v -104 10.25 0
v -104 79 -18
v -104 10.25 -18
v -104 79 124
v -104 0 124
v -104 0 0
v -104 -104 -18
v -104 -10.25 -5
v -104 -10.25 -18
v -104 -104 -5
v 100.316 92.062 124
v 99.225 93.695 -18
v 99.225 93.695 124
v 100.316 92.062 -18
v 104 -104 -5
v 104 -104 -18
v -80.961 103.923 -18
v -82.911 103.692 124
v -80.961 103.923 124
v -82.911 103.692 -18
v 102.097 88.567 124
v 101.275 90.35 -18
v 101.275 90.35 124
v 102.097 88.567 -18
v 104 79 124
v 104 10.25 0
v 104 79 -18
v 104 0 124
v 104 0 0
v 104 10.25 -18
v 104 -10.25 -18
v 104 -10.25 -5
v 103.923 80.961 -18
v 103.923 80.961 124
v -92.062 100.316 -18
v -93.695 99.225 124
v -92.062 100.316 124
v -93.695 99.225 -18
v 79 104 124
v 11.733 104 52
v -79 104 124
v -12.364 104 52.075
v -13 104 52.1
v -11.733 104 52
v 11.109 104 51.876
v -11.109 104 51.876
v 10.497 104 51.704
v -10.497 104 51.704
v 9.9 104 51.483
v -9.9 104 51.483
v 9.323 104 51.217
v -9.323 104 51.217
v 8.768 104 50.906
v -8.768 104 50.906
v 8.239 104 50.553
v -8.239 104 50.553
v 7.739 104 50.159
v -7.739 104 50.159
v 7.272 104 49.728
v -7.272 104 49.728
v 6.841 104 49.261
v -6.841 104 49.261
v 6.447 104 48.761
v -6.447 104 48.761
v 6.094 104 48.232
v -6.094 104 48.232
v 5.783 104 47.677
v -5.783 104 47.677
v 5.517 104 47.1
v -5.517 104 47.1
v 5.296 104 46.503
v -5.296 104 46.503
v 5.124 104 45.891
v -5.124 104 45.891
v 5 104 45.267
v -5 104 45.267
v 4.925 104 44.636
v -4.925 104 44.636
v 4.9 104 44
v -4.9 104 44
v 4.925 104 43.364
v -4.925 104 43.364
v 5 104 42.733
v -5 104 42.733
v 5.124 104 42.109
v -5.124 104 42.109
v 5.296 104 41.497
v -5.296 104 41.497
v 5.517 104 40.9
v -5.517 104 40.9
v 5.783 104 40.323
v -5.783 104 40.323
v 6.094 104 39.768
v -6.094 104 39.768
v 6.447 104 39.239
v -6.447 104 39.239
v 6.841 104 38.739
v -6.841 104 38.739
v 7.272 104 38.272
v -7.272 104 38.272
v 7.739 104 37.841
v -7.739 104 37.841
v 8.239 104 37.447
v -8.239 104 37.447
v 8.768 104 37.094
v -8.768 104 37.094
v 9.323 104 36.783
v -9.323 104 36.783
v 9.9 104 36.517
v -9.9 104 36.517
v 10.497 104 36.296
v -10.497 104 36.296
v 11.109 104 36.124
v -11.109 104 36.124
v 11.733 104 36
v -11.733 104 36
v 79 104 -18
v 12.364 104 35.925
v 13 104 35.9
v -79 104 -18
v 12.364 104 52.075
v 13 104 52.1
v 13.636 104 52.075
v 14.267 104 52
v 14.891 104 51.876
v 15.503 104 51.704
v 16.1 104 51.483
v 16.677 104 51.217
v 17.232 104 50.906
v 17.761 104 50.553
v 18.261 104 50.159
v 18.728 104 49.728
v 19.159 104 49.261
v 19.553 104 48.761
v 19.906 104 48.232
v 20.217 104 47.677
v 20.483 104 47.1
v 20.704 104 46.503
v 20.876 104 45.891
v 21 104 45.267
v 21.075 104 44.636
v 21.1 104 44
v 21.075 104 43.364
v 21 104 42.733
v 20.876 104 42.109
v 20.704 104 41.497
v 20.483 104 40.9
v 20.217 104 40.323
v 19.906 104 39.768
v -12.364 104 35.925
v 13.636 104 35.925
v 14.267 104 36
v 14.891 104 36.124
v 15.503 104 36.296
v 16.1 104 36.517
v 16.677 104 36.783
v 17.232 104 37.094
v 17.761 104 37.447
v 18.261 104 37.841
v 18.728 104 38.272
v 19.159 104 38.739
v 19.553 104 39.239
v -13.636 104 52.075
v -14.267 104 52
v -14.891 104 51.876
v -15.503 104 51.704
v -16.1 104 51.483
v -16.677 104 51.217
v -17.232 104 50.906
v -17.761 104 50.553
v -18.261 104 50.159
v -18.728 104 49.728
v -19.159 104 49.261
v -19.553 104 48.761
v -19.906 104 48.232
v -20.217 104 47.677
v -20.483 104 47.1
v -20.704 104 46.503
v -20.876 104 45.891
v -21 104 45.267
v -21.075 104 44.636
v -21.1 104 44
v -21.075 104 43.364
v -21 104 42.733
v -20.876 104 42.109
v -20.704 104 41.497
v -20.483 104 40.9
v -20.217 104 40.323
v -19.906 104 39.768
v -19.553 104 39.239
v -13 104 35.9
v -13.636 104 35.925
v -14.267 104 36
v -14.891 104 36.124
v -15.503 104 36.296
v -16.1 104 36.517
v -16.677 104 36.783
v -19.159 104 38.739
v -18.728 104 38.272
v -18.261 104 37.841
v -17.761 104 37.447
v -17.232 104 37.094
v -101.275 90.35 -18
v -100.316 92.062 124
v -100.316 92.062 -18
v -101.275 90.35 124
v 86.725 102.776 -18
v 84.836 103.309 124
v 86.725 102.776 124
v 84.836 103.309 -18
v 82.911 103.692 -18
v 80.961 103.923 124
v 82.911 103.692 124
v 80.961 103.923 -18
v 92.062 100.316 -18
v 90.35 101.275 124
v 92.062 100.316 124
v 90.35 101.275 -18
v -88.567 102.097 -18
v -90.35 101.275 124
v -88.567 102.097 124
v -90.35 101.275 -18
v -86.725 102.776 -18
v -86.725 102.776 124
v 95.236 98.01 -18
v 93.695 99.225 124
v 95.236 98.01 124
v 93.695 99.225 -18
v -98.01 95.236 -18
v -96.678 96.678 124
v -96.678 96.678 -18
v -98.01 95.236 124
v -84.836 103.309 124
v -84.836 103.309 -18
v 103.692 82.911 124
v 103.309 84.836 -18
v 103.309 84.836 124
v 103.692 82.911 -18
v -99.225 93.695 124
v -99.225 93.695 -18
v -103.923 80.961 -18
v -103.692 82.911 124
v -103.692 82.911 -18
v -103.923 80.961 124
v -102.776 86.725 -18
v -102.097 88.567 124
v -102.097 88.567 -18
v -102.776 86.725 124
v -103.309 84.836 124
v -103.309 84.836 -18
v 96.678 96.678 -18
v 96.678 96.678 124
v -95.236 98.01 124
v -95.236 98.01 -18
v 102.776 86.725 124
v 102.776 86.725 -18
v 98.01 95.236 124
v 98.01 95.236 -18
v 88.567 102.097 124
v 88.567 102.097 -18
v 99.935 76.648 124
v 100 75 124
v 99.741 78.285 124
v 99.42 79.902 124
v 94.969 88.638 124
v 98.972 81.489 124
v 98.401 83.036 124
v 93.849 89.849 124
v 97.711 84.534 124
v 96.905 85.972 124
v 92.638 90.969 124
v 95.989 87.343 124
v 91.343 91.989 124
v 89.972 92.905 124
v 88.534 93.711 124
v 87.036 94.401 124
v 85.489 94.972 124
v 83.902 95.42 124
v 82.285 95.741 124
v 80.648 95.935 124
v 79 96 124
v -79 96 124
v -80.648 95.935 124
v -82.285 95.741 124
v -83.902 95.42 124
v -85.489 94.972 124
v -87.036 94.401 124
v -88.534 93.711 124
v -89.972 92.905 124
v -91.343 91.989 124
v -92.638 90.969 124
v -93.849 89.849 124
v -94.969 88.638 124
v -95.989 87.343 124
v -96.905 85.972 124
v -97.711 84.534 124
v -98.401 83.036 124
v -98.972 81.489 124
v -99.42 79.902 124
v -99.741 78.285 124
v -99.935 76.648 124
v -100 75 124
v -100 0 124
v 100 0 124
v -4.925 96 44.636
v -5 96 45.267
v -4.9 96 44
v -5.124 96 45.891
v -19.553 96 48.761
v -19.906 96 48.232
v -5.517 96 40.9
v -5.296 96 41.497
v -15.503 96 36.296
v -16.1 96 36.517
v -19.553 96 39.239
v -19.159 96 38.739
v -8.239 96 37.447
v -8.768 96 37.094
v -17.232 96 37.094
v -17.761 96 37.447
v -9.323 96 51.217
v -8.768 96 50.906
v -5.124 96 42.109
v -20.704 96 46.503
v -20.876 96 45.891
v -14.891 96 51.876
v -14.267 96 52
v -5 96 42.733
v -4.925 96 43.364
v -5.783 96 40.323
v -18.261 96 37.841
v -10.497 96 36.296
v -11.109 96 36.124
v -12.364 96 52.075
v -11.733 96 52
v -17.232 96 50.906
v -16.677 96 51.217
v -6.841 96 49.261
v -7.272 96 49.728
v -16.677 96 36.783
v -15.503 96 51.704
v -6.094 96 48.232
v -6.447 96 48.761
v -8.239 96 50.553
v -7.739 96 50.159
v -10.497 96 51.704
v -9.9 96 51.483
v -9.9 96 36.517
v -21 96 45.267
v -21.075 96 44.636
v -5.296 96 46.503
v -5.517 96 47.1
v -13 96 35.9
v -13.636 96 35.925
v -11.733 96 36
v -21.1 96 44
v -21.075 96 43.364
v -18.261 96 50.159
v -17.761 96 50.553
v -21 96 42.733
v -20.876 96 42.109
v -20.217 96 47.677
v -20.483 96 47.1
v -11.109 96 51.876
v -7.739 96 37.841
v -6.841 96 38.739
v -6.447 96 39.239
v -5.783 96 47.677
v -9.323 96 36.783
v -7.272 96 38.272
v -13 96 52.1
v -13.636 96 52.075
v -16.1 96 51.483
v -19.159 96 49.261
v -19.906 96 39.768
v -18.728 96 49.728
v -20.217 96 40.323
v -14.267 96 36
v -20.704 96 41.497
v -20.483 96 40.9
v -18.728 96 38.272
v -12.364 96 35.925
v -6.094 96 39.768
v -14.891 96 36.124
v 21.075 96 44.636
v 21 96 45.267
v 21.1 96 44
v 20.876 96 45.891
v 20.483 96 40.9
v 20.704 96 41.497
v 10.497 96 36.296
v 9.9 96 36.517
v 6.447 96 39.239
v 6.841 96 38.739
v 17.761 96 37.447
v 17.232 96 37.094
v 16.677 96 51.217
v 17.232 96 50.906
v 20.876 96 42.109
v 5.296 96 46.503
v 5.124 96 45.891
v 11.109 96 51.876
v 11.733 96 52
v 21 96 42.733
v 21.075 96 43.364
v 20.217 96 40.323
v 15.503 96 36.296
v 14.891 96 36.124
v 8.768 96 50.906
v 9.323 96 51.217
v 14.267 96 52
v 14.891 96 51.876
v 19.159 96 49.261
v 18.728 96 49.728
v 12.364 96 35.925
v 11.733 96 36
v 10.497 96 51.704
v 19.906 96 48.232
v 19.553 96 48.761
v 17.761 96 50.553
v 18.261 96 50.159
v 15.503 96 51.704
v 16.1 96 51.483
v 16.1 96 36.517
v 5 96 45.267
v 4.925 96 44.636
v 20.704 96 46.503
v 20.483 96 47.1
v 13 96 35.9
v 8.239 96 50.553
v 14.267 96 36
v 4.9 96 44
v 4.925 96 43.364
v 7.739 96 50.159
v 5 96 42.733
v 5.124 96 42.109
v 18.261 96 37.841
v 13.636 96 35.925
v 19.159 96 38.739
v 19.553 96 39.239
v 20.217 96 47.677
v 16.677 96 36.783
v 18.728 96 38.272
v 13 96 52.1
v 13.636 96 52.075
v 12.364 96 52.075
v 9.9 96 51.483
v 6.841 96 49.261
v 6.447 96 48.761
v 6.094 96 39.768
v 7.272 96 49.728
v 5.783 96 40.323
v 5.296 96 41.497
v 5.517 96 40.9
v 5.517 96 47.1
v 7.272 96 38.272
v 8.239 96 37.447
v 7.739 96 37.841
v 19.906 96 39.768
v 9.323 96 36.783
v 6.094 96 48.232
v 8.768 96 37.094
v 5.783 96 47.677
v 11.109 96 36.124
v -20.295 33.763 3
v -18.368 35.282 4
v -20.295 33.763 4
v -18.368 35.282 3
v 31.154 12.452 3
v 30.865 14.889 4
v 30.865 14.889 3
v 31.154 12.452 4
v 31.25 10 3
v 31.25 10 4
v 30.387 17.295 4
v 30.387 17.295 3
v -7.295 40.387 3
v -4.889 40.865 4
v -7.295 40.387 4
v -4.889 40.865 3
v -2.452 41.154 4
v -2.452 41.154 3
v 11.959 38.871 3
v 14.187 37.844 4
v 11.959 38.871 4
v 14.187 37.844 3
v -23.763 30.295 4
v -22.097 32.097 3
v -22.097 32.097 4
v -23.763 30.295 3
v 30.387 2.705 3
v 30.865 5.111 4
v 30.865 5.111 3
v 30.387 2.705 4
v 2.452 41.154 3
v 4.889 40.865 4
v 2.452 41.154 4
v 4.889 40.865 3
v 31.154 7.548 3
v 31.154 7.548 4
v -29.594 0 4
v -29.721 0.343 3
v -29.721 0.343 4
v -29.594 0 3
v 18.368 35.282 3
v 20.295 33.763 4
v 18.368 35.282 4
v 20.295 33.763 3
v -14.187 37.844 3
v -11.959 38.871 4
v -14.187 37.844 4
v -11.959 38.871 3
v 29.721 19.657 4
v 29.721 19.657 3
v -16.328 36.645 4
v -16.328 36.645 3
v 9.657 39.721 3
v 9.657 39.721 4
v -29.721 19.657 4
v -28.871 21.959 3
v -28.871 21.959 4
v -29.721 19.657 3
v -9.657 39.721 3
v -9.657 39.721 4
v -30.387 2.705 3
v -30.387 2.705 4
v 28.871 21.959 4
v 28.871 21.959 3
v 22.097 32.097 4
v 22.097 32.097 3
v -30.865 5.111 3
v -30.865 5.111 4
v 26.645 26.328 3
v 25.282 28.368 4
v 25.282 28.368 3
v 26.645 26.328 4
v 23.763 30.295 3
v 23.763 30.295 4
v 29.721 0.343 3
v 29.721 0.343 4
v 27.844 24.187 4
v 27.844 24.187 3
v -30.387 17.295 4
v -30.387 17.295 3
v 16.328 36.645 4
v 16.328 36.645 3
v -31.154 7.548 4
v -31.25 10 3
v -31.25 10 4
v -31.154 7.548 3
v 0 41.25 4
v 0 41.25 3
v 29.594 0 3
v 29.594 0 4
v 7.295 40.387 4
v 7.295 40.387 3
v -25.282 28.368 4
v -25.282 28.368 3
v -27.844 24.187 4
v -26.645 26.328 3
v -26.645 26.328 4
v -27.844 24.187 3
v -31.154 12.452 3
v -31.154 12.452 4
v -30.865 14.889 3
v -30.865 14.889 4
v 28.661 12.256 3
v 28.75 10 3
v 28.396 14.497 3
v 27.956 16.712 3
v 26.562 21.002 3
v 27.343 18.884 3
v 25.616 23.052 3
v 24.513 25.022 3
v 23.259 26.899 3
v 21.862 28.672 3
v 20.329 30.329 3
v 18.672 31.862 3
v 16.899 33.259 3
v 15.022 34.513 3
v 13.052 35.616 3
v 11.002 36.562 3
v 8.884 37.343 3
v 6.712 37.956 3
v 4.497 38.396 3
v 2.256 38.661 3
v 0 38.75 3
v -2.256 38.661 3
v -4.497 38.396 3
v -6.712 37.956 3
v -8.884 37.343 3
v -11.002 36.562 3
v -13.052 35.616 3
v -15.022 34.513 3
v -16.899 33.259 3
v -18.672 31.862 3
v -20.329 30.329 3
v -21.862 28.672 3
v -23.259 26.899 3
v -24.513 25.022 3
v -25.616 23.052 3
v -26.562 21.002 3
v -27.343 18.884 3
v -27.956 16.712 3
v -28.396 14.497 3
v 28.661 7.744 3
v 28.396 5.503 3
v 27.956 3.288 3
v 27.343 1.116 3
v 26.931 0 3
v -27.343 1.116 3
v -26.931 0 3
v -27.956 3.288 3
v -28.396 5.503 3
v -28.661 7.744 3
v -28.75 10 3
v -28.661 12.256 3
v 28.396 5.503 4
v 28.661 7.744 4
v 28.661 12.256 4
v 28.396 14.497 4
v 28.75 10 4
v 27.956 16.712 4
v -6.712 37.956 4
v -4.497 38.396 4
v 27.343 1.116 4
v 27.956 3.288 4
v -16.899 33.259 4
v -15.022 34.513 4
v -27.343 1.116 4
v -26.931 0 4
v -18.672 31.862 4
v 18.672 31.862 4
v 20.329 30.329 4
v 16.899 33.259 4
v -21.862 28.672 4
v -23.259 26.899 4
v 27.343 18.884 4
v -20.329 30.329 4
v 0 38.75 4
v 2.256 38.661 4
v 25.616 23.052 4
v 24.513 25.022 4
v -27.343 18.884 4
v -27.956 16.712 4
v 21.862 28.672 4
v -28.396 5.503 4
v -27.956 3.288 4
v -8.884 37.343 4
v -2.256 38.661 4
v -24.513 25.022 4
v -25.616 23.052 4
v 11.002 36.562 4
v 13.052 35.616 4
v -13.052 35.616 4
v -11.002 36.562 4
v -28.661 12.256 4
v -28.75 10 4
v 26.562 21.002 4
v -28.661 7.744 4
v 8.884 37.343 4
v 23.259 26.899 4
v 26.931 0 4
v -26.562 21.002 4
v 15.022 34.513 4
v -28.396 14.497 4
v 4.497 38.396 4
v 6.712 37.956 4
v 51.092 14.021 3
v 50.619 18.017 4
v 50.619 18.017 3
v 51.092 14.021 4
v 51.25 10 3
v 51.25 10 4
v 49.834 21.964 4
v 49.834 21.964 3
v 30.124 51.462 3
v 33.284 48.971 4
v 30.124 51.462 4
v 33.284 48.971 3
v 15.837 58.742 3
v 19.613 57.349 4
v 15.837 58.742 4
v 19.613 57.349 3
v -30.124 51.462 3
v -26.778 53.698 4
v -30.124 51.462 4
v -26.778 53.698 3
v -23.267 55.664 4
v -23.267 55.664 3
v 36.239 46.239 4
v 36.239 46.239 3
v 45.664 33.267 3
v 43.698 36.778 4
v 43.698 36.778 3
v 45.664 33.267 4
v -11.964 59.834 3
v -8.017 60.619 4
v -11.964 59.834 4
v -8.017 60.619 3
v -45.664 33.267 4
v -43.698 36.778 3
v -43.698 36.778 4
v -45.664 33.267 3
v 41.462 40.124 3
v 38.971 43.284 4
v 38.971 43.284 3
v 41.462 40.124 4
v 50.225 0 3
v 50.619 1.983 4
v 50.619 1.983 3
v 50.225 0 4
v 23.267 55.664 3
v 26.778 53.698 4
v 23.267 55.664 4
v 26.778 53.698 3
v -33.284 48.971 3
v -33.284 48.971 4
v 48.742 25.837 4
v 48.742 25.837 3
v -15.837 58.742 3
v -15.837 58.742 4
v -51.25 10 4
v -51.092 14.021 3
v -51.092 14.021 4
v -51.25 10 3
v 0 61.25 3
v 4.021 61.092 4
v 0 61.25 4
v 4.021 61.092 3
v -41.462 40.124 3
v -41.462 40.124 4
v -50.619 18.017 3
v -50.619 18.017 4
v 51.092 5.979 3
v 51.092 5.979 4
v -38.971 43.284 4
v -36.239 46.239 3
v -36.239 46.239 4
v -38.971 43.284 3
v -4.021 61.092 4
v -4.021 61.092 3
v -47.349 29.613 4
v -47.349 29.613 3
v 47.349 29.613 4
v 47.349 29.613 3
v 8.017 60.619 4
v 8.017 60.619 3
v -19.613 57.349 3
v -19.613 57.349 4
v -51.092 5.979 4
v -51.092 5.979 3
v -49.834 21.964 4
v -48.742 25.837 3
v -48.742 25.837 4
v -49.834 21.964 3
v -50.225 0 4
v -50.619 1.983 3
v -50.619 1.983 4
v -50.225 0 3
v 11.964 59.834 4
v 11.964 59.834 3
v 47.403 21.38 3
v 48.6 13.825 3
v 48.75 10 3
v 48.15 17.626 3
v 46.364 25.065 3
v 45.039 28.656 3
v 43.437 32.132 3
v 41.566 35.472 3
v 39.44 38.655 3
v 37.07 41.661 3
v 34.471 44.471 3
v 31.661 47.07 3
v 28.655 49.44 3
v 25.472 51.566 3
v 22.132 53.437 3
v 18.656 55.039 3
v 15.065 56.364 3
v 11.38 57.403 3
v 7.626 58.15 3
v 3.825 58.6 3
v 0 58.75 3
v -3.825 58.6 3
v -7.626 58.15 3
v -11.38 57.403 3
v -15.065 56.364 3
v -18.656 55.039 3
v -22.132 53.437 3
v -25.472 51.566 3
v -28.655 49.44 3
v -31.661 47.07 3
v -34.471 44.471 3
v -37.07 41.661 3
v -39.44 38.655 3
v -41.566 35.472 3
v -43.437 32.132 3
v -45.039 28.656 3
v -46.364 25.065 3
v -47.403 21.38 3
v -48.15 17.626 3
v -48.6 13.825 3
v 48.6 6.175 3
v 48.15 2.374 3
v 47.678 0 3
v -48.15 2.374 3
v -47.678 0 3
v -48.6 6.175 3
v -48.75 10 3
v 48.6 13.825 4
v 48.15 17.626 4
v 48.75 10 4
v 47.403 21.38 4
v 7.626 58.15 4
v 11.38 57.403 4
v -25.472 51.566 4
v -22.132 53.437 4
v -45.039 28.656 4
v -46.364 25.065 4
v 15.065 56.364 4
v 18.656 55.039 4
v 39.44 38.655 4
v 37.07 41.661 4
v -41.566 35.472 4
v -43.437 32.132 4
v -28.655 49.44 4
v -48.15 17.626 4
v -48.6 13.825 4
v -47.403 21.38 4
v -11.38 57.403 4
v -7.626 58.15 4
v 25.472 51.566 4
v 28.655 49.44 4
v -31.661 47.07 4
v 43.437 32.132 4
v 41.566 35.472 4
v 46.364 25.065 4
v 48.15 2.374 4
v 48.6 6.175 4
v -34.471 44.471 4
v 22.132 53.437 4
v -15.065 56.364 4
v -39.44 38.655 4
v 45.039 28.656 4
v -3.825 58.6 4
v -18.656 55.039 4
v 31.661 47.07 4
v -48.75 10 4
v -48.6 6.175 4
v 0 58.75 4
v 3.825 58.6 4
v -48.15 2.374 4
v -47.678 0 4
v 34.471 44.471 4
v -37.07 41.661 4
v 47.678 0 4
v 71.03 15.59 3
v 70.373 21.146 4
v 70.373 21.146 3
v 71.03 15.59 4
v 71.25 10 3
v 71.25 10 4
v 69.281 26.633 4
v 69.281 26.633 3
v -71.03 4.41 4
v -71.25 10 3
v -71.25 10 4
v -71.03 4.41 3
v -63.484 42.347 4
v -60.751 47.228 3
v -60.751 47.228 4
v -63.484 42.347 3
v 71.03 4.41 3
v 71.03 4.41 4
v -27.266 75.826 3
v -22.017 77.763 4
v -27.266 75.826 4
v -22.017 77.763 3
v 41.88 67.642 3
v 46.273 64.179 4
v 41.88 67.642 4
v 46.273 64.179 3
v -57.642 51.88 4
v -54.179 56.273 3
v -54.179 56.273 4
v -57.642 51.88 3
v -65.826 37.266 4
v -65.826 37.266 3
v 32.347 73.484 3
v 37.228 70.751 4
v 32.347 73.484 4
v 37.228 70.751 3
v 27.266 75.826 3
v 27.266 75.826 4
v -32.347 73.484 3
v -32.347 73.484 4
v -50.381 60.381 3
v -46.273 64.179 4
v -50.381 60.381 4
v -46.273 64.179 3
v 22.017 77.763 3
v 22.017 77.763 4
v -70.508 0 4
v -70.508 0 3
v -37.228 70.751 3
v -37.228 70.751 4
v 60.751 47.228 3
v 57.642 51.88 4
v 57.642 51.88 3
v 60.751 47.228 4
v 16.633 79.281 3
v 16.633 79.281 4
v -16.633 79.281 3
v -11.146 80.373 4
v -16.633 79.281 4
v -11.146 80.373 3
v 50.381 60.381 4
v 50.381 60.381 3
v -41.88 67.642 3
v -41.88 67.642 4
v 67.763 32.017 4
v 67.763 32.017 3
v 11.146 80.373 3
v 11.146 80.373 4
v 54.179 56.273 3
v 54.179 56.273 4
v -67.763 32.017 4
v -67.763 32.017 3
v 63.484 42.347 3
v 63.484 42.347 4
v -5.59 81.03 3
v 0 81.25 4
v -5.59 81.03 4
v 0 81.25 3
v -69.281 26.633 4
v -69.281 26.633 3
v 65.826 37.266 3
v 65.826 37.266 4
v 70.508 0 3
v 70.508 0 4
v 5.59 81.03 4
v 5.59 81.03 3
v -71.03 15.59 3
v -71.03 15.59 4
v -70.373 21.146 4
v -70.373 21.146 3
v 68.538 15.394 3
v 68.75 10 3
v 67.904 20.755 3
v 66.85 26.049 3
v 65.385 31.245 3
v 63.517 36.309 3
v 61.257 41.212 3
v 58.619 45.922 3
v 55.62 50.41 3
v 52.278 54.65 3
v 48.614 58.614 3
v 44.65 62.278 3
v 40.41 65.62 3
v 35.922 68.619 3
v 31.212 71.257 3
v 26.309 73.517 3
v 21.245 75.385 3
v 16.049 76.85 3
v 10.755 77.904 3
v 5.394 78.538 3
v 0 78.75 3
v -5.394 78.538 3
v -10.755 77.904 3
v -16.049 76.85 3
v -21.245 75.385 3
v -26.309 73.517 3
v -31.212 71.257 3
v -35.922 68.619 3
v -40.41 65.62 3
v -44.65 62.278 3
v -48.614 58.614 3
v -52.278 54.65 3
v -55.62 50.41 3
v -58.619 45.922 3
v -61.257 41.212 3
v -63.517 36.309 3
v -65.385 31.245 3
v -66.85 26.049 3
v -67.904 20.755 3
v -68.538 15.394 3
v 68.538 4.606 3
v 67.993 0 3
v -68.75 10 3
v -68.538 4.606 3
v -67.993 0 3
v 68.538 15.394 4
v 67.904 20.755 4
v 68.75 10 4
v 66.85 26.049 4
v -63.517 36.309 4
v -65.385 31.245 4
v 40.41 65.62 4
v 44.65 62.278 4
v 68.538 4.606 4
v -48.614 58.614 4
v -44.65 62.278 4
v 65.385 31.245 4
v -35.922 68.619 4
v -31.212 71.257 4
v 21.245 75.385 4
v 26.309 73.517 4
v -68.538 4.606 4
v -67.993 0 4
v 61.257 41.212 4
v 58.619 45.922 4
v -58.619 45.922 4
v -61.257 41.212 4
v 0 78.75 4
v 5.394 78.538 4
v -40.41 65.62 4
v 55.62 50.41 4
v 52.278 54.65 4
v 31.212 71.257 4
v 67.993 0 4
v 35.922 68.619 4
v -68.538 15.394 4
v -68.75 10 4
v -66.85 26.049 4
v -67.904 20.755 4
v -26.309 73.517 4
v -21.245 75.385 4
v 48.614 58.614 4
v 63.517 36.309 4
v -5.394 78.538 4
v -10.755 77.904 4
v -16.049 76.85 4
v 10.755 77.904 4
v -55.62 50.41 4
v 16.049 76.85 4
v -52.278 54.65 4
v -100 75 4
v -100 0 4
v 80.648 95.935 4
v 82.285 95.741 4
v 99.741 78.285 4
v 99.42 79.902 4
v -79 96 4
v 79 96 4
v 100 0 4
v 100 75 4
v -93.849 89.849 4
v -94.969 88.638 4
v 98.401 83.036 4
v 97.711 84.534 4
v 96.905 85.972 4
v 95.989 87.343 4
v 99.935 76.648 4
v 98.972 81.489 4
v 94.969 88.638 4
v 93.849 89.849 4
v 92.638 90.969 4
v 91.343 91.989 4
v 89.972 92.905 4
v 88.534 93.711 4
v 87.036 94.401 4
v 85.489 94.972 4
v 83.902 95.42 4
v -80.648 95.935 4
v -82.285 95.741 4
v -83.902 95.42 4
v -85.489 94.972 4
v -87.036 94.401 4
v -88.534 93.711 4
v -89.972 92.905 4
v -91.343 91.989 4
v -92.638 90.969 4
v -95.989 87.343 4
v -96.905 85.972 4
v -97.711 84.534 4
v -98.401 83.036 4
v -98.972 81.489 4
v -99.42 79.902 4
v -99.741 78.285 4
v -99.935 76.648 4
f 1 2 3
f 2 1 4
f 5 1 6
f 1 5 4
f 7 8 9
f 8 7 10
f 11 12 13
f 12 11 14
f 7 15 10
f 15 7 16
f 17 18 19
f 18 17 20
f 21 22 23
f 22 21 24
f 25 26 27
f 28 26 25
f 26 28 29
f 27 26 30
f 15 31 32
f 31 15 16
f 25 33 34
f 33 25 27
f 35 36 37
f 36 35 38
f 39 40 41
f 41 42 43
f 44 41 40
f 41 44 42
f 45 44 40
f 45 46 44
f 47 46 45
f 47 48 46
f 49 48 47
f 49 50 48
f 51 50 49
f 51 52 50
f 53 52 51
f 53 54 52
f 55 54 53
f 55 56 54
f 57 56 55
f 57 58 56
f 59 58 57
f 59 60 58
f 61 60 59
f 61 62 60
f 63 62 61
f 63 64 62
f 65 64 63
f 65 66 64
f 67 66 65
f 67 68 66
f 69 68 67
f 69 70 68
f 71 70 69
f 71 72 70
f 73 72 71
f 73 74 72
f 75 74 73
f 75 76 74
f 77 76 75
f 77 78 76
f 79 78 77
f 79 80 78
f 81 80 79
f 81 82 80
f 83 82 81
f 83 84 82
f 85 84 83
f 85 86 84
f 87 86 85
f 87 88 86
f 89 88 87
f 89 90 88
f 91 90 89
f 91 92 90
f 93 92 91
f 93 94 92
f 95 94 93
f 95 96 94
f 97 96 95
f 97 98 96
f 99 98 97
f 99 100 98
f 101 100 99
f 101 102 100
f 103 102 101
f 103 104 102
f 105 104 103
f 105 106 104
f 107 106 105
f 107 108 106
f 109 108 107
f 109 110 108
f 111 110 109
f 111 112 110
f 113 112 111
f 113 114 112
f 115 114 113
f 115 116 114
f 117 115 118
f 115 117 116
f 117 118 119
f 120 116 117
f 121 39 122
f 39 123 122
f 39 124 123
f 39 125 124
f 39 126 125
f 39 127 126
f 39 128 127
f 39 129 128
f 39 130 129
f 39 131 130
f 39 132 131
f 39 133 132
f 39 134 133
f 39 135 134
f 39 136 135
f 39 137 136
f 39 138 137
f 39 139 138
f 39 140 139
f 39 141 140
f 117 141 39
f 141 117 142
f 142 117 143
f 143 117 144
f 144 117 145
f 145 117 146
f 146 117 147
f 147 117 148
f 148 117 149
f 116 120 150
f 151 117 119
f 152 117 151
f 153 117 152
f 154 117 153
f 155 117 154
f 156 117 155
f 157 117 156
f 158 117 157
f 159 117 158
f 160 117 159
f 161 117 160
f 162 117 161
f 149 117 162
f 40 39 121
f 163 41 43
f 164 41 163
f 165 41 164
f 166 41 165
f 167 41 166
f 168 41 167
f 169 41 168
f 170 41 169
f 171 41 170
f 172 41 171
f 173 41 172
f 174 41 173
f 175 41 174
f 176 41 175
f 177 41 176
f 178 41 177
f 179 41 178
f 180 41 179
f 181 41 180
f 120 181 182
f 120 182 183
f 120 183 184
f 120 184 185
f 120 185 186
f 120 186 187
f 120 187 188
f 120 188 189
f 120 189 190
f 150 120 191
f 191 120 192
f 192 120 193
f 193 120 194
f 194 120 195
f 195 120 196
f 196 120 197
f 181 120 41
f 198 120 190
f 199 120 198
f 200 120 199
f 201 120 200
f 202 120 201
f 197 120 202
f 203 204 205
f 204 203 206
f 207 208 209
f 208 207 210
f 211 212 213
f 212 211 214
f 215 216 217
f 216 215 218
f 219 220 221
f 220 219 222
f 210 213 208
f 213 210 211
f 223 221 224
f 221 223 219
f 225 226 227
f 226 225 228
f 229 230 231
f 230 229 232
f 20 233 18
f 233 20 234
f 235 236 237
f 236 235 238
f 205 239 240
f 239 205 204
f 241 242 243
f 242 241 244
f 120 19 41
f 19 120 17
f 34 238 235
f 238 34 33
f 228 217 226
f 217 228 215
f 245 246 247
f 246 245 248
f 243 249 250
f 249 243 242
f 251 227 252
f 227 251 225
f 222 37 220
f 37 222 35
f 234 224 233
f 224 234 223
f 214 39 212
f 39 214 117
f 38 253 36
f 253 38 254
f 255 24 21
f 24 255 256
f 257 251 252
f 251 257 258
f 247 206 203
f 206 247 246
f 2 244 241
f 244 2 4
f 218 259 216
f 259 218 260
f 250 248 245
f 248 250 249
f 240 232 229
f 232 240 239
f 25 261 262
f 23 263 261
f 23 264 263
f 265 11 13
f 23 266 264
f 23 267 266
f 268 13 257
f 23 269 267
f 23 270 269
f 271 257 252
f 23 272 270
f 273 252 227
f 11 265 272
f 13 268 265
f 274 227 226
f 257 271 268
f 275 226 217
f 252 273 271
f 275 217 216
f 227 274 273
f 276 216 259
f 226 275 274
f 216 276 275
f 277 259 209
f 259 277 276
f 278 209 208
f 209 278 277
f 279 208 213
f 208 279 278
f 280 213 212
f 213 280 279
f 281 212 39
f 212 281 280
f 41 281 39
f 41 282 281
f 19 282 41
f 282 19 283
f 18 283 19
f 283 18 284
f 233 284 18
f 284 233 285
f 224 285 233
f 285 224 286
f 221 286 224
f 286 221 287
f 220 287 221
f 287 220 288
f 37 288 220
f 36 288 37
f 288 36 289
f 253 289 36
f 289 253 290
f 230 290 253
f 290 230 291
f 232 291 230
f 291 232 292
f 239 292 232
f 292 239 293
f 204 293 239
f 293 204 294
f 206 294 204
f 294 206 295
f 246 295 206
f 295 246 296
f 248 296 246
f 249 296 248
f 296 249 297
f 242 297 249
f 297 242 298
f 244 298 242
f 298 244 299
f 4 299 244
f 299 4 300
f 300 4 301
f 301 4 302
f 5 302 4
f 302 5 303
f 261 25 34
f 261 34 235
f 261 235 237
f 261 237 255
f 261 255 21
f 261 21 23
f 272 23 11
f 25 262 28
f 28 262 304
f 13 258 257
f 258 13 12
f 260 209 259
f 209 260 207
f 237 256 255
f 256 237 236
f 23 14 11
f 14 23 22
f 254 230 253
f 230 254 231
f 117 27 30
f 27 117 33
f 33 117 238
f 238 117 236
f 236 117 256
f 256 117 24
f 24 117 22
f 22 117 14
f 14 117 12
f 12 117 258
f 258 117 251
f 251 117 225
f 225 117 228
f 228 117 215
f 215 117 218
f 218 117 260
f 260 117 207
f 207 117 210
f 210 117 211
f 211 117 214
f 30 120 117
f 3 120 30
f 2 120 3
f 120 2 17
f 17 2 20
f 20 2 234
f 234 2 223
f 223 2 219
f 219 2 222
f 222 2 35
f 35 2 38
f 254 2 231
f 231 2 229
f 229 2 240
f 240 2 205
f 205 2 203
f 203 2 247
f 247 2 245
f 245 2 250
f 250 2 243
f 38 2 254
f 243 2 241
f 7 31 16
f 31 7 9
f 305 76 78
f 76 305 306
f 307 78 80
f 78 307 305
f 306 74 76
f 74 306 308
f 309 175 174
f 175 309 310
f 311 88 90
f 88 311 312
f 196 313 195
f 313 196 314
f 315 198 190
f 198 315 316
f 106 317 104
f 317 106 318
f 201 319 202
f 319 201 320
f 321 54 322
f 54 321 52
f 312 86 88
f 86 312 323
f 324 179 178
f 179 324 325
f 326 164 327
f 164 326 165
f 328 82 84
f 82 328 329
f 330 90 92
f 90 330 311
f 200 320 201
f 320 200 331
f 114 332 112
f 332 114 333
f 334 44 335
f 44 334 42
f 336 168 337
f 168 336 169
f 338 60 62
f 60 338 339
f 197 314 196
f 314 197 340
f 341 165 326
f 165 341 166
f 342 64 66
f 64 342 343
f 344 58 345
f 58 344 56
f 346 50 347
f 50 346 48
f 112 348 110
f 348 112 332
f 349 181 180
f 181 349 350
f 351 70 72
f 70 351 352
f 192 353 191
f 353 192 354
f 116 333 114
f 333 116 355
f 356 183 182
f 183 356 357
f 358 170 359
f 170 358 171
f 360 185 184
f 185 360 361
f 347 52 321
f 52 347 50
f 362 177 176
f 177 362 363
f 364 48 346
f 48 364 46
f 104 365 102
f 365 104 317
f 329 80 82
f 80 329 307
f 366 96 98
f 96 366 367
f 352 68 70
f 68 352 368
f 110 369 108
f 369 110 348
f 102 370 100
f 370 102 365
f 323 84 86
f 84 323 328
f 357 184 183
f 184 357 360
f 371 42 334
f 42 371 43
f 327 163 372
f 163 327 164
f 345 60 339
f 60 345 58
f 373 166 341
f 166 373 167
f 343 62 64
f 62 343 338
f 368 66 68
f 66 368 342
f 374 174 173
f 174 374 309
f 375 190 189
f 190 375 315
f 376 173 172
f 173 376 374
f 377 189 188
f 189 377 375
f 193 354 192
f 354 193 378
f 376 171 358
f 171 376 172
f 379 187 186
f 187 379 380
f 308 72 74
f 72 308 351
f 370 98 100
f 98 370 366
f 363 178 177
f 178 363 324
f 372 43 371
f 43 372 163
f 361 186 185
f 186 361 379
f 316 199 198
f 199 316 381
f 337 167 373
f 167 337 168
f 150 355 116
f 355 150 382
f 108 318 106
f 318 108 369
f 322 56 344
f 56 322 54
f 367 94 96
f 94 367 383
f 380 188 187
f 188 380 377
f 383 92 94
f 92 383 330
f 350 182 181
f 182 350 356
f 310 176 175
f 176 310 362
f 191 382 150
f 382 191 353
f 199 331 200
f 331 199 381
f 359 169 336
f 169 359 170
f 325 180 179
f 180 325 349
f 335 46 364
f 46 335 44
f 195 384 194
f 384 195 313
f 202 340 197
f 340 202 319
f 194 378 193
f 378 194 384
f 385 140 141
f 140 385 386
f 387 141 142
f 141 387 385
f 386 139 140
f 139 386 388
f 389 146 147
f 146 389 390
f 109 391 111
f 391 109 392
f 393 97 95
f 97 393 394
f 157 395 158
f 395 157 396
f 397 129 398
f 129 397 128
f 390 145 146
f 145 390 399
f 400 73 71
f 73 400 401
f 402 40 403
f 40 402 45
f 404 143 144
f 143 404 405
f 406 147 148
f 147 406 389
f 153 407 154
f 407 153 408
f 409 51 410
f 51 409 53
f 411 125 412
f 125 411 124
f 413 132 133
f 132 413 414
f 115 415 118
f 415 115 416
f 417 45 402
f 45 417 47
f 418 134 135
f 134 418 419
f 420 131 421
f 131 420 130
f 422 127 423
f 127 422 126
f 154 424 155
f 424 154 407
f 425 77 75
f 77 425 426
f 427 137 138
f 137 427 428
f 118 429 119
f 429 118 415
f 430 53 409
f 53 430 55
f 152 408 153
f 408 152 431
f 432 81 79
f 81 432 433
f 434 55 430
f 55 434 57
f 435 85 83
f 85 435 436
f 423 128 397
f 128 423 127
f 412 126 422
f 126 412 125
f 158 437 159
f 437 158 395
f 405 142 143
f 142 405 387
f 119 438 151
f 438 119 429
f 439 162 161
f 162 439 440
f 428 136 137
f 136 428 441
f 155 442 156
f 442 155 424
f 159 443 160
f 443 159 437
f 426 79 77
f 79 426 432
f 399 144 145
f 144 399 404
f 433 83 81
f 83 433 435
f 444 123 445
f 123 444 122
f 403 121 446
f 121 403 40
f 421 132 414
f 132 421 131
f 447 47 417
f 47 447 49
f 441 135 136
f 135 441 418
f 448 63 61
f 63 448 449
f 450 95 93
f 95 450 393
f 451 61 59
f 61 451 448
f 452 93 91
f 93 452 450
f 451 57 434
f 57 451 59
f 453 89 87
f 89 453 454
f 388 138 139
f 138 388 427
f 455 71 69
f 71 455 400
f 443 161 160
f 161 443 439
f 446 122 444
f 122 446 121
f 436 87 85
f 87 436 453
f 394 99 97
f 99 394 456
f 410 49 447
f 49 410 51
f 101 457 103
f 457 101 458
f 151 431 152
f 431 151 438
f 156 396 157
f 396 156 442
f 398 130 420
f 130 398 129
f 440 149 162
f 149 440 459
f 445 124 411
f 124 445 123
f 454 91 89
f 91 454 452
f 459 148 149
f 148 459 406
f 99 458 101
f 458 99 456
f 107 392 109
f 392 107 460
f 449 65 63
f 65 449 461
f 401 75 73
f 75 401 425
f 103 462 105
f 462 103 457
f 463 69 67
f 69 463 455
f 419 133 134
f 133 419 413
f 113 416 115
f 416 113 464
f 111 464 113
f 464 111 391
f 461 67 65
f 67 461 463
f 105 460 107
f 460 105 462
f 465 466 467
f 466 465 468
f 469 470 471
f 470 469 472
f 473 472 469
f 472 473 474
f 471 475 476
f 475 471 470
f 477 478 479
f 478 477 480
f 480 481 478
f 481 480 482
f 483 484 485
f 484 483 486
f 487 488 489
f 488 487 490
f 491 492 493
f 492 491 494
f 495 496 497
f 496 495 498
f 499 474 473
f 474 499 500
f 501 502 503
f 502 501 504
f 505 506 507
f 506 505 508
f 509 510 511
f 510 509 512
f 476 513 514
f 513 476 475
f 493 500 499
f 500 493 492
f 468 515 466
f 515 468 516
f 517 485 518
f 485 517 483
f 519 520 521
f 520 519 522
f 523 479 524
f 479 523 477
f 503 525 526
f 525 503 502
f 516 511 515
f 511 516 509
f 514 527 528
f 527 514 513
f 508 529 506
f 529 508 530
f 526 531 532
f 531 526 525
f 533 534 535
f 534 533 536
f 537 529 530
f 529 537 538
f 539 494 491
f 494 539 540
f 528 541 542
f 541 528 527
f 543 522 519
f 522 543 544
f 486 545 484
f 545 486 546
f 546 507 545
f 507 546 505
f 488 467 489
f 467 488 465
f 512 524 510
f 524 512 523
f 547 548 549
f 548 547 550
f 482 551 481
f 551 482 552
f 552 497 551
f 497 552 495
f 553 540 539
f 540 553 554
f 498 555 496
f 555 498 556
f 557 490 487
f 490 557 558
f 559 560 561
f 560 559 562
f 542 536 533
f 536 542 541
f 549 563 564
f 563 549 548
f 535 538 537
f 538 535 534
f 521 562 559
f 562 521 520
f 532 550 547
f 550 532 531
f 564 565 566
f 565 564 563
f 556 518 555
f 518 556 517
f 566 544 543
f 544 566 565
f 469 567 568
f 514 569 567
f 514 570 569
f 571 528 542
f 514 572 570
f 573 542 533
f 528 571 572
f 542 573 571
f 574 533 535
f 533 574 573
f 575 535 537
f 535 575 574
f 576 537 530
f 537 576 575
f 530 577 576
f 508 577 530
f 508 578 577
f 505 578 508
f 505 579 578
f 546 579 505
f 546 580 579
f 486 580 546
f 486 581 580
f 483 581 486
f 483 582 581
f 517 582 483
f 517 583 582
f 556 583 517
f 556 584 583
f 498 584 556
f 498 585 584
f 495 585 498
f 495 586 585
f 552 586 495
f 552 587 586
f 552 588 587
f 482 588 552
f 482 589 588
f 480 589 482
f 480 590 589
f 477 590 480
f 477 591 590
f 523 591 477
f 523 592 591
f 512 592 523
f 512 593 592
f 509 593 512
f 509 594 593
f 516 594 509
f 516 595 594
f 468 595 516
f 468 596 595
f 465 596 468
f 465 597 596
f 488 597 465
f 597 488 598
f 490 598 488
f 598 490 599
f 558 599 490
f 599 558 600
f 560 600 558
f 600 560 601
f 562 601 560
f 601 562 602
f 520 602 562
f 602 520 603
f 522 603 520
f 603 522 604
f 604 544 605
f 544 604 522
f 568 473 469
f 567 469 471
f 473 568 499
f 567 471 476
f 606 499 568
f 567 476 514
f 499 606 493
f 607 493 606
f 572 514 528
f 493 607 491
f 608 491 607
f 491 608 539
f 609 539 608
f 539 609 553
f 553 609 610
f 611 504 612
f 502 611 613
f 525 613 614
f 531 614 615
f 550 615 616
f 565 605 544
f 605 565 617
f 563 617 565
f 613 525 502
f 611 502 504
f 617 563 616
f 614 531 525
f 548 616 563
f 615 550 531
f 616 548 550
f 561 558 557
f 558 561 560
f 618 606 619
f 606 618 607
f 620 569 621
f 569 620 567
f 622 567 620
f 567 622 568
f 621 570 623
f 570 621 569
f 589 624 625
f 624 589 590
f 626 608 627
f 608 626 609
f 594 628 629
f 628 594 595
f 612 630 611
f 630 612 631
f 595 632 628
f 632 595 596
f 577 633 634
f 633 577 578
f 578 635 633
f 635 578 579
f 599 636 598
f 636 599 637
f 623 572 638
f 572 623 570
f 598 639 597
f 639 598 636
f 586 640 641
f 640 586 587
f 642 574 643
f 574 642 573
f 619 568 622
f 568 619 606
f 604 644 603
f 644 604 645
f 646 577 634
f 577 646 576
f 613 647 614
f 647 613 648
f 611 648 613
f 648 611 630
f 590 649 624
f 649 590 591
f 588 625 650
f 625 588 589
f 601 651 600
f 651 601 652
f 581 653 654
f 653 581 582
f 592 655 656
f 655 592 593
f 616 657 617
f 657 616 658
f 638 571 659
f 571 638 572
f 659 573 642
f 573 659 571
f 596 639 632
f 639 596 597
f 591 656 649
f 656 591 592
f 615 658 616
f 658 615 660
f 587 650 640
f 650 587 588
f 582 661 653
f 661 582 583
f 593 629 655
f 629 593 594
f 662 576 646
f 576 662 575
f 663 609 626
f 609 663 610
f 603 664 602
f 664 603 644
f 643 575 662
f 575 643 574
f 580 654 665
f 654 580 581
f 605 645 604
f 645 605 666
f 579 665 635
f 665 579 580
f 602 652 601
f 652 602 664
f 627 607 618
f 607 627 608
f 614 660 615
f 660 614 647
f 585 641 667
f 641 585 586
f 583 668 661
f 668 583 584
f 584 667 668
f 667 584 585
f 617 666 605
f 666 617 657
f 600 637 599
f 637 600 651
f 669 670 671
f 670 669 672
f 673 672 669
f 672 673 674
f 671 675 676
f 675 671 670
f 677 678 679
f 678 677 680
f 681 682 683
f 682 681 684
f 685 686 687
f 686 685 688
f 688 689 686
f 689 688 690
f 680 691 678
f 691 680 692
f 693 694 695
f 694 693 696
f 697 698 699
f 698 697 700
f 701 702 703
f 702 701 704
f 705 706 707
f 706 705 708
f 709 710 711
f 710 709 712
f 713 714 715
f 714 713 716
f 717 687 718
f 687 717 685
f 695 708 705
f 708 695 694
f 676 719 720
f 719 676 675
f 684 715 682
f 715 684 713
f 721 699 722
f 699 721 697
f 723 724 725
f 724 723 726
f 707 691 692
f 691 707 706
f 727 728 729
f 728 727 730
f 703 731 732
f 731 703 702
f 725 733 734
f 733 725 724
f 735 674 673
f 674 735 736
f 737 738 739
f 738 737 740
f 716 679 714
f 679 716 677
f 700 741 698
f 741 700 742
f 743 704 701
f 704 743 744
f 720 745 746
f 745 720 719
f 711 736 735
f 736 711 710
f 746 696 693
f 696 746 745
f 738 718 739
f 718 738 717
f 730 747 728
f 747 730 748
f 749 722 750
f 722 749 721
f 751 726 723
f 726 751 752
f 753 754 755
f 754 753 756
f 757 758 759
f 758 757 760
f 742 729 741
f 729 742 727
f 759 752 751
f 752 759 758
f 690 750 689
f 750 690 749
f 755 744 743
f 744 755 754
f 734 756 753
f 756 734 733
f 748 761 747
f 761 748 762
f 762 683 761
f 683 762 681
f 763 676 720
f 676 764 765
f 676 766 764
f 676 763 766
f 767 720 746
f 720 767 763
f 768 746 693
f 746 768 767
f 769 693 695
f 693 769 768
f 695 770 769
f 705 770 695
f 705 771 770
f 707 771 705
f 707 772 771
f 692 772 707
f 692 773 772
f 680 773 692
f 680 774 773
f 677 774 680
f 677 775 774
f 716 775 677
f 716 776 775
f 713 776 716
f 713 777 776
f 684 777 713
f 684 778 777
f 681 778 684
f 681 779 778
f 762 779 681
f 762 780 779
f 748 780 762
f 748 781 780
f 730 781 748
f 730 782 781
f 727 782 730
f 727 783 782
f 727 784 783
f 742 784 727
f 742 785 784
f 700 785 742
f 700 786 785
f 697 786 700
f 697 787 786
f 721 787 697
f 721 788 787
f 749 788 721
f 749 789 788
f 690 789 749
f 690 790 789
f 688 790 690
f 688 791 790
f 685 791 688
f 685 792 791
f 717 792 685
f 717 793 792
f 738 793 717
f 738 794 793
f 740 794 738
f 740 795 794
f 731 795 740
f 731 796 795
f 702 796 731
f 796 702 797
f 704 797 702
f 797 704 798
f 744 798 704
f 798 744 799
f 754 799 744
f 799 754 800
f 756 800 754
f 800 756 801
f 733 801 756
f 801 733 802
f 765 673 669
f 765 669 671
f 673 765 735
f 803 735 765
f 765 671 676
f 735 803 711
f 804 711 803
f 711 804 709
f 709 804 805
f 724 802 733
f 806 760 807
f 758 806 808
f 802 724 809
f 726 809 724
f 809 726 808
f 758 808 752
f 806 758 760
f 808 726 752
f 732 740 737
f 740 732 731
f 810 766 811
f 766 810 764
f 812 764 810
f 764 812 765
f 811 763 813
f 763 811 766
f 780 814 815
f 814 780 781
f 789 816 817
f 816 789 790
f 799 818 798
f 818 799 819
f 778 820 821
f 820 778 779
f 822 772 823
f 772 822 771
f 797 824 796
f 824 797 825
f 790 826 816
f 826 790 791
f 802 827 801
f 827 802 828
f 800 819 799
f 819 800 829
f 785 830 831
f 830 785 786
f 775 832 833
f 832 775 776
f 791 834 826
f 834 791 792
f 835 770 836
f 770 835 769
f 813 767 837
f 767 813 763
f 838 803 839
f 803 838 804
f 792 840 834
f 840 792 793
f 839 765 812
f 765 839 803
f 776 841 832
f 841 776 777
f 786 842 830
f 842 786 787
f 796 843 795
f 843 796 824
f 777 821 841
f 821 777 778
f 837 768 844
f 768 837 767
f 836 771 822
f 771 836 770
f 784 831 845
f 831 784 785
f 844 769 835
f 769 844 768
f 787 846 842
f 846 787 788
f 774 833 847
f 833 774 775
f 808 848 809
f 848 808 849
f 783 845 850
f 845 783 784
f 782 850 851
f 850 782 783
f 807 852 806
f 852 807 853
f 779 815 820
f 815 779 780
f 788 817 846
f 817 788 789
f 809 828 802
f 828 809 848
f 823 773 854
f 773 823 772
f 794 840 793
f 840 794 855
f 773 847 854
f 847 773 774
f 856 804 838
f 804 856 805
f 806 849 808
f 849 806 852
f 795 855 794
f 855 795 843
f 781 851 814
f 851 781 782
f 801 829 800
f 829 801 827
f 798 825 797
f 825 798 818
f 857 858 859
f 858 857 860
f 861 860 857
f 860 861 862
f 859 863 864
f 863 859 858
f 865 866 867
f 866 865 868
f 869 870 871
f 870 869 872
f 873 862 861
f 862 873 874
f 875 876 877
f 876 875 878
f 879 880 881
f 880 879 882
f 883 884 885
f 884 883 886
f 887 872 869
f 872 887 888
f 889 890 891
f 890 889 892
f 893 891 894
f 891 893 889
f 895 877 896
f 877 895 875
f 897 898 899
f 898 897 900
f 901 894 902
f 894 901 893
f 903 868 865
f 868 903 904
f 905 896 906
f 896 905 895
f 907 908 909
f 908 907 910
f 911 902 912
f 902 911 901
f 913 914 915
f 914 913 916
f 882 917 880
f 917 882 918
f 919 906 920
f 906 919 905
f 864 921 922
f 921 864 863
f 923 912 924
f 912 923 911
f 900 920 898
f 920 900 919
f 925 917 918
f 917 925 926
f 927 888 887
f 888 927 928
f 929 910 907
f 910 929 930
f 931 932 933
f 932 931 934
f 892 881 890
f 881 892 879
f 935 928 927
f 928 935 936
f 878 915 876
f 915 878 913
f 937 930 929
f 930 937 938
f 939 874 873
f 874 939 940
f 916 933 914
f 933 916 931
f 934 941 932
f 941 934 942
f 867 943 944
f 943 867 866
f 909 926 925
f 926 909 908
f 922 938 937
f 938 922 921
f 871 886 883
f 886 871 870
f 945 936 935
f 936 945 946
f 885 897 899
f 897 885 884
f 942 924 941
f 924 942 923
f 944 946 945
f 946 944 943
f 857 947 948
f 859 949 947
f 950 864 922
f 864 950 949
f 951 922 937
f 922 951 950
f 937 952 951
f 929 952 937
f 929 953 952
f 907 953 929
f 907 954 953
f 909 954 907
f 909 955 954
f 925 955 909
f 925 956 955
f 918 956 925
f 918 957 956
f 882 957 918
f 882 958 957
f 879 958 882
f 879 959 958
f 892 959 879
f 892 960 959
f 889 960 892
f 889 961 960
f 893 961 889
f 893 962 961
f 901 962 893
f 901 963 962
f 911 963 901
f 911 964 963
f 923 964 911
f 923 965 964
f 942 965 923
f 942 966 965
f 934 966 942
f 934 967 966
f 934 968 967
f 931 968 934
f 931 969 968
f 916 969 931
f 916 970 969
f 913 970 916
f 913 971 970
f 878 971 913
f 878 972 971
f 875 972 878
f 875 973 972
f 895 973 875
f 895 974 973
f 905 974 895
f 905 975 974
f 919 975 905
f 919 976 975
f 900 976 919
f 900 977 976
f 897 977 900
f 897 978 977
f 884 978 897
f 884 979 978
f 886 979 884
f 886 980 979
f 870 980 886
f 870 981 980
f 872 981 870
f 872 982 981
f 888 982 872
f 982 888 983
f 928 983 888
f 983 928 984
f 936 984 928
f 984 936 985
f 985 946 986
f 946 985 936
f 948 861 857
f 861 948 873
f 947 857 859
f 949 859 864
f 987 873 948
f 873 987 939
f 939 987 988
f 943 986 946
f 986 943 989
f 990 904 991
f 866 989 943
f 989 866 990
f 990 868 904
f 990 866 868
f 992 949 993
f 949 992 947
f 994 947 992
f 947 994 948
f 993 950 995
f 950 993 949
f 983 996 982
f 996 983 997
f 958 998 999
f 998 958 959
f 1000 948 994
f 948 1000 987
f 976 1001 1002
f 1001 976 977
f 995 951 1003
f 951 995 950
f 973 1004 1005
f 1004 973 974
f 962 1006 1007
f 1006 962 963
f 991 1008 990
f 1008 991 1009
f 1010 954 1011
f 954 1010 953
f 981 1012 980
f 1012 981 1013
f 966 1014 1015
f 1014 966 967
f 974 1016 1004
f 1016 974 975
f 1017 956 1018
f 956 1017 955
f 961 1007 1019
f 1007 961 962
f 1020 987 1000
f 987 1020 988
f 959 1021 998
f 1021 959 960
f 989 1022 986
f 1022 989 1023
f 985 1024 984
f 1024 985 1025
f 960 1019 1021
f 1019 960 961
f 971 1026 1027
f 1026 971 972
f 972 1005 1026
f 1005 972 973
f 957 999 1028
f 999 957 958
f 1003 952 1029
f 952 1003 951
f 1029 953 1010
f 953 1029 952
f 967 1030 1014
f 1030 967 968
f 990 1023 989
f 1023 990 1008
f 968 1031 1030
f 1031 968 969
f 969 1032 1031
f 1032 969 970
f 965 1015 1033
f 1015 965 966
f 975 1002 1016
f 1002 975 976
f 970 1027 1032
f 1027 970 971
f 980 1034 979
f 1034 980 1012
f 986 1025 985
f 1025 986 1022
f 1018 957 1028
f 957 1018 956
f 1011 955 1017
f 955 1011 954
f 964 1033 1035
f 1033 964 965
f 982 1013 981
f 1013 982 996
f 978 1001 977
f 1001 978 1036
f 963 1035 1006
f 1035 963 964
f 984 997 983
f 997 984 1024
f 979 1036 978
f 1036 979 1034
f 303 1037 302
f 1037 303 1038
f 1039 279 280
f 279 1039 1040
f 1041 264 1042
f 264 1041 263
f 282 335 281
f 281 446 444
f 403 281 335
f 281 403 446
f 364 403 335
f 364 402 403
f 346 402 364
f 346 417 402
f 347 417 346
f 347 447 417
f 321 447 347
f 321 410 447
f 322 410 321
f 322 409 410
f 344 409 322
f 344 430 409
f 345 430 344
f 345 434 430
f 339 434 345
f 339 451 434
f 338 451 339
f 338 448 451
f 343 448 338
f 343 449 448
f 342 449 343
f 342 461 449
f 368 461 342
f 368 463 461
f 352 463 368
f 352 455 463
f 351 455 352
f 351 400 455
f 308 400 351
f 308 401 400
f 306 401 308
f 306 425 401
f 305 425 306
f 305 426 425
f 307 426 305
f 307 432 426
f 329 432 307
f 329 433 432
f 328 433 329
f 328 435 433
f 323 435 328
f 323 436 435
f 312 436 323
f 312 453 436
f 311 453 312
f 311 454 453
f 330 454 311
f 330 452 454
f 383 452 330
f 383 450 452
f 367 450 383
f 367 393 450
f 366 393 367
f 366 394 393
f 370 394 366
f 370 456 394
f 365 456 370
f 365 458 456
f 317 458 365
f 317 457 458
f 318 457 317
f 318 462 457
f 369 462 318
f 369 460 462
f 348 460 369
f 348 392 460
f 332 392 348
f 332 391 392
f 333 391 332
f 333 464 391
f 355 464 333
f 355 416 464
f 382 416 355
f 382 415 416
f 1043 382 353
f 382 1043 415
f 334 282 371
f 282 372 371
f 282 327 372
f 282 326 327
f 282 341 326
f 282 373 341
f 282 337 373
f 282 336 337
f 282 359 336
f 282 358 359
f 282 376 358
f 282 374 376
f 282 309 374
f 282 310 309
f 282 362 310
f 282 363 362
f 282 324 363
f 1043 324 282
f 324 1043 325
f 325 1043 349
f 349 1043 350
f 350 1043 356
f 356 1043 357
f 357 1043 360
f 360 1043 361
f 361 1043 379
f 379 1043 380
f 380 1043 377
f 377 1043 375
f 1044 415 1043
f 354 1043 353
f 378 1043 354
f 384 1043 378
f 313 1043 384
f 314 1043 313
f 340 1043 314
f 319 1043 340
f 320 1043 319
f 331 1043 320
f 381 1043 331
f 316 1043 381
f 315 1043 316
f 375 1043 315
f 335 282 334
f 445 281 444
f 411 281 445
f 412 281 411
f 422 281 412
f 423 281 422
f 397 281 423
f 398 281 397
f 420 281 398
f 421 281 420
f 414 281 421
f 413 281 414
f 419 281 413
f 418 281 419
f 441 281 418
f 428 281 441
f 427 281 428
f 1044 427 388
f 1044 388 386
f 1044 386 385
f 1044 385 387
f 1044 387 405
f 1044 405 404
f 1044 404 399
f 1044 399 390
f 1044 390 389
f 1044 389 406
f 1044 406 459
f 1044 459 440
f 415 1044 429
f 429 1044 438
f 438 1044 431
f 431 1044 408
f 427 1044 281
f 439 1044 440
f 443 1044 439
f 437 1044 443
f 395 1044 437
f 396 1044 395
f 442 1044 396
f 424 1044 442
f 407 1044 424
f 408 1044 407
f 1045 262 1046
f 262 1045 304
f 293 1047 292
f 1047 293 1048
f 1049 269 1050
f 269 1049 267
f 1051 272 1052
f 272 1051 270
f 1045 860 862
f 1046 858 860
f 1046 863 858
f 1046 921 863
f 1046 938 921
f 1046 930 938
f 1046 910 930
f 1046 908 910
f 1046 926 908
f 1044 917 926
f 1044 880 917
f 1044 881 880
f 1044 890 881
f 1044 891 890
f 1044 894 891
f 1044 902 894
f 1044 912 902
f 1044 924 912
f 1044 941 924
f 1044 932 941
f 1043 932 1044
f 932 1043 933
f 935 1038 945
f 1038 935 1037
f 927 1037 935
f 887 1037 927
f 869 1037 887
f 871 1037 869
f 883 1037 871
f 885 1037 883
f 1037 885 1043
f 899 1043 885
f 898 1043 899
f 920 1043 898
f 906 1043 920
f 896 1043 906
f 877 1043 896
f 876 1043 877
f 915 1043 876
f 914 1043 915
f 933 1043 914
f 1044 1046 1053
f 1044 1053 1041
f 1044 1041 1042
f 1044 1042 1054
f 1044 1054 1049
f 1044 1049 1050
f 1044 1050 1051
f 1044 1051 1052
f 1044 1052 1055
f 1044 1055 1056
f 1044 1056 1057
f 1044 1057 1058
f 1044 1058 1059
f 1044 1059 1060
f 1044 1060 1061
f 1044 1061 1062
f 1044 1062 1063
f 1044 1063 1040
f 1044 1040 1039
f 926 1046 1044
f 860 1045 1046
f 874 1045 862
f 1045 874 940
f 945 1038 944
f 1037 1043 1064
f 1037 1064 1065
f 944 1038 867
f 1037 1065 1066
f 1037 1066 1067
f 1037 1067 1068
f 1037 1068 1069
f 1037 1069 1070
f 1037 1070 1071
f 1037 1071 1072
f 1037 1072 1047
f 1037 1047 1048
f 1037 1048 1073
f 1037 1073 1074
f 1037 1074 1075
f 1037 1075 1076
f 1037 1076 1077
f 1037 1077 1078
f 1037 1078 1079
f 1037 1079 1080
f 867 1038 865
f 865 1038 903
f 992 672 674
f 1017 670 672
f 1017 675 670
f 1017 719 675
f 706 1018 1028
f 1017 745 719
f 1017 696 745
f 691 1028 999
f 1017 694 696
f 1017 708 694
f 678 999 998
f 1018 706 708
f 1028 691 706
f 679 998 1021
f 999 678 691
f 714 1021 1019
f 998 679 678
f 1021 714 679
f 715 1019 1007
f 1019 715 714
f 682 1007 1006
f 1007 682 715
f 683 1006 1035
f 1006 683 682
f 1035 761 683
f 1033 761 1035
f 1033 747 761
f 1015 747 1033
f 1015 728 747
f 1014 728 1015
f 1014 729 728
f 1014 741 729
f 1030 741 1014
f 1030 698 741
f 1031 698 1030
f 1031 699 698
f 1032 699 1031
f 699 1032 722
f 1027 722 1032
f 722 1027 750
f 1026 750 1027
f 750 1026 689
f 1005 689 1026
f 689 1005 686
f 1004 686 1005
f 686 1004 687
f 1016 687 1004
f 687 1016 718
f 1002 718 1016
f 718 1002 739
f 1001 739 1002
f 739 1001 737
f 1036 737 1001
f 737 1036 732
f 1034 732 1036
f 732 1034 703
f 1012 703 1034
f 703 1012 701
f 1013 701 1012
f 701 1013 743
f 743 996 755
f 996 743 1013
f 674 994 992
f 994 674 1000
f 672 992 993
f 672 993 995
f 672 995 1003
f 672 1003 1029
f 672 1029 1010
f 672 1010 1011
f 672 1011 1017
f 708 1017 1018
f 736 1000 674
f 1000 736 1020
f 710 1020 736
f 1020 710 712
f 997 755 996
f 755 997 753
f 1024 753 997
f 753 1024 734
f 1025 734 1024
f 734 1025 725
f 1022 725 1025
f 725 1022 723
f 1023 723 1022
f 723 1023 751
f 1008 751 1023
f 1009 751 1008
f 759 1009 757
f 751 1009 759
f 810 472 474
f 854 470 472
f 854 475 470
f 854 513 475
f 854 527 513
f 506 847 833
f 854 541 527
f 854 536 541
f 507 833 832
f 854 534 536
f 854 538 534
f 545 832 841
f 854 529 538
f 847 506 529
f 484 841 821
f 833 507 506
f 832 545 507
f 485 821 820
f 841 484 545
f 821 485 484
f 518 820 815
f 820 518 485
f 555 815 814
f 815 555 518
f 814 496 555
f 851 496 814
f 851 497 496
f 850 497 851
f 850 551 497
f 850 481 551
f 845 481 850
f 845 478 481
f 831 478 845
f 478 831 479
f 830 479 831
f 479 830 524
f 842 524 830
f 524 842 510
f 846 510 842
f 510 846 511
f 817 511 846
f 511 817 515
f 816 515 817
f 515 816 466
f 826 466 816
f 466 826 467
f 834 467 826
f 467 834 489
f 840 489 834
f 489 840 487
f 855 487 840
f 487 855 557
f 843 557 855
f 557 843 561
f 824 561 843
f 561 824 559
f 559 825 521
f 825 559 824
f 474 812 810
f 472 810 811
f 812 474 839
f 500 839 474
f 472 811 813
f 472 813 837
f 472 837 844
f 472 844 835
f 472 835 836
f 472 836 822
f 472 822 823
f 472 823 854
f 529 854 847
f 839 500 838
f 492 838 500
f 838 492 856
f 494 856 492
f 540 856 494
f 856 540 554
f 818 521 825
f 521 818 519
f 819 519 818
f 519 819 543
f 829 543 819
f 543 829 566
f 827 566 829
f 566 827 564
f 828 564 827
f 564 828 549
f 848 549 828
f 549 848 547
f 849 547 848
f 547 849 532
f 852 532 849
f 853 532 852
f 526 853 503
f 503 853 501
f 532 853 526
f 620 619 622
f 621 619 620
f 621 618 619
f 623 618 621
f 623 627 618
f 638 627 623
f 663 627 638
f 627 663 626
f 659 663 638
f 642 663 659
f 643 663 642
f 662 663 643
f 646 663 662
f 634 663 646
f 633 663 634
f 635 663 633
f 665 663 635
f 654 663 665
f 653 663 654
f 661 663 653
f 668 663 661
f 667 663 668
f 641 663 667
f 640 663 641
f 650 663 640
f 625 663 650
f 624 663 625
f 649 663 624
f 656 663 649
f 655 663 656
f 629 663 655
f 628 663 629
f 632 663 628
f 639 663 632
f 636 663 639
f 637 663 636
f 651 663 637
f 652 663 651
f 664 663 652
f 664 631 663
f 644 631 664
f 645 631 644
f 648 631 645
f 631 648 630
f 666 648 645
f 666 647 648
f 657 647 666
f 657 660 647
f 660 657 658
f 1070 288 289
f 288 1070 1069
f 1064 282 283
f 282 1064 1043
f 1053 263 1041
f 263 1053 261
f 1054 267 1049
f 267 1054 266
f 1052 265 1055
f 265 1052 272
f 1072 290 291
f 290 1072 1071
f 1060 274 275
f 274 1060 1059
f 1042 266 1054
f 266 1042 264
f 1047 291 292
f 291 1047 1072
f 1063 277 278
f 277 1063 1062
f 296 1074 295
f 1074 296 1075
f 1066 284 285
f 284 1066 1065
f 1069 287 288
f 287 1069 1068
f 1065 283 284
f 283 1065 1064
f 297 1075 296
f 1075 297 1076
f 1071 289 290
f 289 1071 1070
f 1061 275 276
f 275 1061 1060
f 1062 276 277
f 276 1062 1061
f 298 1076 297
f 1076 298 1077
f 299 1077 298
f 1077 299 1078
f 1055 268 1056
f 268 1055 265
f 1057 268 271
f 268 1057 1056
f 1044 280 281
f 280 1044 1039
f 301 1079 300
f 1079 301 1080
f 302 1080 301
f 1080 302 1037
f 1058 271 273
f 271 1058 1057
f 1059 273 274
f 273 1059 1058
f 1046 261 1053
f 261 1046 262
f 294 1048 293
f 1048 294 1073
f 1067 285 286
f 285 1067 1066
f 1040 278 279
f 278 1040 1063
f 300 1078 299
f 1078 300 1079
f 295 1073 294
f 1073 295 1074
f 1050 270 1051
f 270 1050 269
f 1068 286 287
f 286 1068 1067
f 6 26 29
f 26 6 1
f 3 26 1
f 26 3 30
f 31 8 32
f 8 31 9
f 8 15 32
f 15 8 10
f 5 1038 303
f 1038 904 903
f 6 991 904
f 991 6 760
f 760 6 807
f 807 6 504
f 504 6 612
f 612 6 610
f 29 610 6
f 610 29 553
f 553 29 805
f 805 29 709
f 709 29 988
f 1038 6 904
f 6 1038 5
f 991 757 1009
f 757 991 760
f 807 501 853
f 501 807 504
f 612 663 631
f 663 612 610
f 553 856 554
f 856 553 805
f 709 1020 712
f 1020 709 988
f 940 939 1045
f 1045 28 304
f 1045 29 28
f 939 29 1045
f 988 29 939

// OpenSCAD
extrusion_outer_width = 200.0; // Your 2020 frame width (200mm)
extrusion_profile     = 20.0;  // 20mm profile width
wall_thickness        = 4.0;   // Beefier walls for smooth rounding
base_floor_thickness  = 4.0;   // The floor your mug sits on
guard_height          = 120.0; 
corner_radius         = 25.0;  // Controls the outer corner rounding
sr04_transceiver_dia = 16.2;   // Diameter for sonar cylinders
sr04_center_spacing  = 26.0;   // Center-to-center distance of the eyes
sensor_height_pos    = 40.0;   // Height of the sensor from the floor

outer_dim = extrusion_outer_width + (wall_thickness * 2);
lip_down  = 18.0; // How far the encapsulation walls drop down over the 2020 rails

$fn = 80; 

module rounded_cube_profile(width, depth, height, radius) {
    linear_extrude(height = height, center = true) {
        hull() {
            // Back corners are rounded
            translate([-(width/2 - radius), (depth/2 - radius)]) circle(r = radius);
            translate([(width/2 - radius), (depth/2 - radius)]) circle(r = radius);
            // Front corners remain sharp/square for the opening
            translate([-(width/2), -(depth/2)]) square([radius, radius]);
            translate([(width/2 - radius), -(depth/2)]) square([radius, radius]);
        }
    }
}

difference() {
    // 1. SOLID BASE + WALLS + ENCAPSULATION SKIRT
    union() {
        // Upper splashguard tower
        translate([0, 0, (guard_height + base_floor_thickness)/2])
            rounded_cube_profile(outer_dim, outer_dim, guard_height + base_floor_thickness, corner_radius);
        
        // Lower encapsulation skirt (drops DOWN over the outside of the 2020 frame)
        translate([0, 0, -lip_down/2])
            rounded_cube_profile(outer_dim, outer_dim, lip_down, corner_radius);
    }

    // 2. HOLLOW OUT THE MUG CHAMBER
    translate([0, -wall_thickness, (guard_height + 10)/2 + base_floor_thickness])
        rounded_cube_profile(extrusion_outer_width, extrusion_outer_width, guard_height + 10, corner_radius - wall_thickness);

    // 3. HOLLOW OUT THE BOTTOM 
    translate([0, 0, -lip_down])
        cube([extrusion_outer_width+10, extrusion_profile+0.5, lip_down * 2], center = true);

    // 4. CUT OUT THE FRONT OPENING
    translate([0, -outer_dim/2, (guard_height + lip_down + 10)/2])
        cube([outer_dim + 2, outer_dim, guard_height + lip_down + 20], center = true);

    // 5. HORIZONTAL HC-SR04 MOUNT (Cut through the center-back wall)
    translate([0, (outer_dim/2) - (wall_thickness/2), sensor_height_pos + base_floor_thickness]) {
        rotate([90, 0, 0]) {
            // Left
            translate([-sr04_center_spacing/2, 0, 0])
                cylinder(h = wall_thickness * 3+1, d = sr04_transceiver_dia, center = true);
            // Right
            translate([sr04_center_spacing/2, 0, 0])
                cylinder(h = wall_thickness * 3+1, d = sr04_transceiver_dia, center = true);
        }
    }

    // 6. SPILL GROOVES
    for (r = [30 : 20 : 70]) {
        translate([0, 10, base_floor_thickness])
            difference() {
                cylinder(h = 2.0, r = r + 1.25, center = true);
                cylinder(h = 3.0, r = r - 1.25, center = true);
            }
    }
}



//    translate([0, 0, -lip_down])
//        cube([extrusion_outer_width+10, extrusion_profile+0.5, lip_down * 2], center = true);
